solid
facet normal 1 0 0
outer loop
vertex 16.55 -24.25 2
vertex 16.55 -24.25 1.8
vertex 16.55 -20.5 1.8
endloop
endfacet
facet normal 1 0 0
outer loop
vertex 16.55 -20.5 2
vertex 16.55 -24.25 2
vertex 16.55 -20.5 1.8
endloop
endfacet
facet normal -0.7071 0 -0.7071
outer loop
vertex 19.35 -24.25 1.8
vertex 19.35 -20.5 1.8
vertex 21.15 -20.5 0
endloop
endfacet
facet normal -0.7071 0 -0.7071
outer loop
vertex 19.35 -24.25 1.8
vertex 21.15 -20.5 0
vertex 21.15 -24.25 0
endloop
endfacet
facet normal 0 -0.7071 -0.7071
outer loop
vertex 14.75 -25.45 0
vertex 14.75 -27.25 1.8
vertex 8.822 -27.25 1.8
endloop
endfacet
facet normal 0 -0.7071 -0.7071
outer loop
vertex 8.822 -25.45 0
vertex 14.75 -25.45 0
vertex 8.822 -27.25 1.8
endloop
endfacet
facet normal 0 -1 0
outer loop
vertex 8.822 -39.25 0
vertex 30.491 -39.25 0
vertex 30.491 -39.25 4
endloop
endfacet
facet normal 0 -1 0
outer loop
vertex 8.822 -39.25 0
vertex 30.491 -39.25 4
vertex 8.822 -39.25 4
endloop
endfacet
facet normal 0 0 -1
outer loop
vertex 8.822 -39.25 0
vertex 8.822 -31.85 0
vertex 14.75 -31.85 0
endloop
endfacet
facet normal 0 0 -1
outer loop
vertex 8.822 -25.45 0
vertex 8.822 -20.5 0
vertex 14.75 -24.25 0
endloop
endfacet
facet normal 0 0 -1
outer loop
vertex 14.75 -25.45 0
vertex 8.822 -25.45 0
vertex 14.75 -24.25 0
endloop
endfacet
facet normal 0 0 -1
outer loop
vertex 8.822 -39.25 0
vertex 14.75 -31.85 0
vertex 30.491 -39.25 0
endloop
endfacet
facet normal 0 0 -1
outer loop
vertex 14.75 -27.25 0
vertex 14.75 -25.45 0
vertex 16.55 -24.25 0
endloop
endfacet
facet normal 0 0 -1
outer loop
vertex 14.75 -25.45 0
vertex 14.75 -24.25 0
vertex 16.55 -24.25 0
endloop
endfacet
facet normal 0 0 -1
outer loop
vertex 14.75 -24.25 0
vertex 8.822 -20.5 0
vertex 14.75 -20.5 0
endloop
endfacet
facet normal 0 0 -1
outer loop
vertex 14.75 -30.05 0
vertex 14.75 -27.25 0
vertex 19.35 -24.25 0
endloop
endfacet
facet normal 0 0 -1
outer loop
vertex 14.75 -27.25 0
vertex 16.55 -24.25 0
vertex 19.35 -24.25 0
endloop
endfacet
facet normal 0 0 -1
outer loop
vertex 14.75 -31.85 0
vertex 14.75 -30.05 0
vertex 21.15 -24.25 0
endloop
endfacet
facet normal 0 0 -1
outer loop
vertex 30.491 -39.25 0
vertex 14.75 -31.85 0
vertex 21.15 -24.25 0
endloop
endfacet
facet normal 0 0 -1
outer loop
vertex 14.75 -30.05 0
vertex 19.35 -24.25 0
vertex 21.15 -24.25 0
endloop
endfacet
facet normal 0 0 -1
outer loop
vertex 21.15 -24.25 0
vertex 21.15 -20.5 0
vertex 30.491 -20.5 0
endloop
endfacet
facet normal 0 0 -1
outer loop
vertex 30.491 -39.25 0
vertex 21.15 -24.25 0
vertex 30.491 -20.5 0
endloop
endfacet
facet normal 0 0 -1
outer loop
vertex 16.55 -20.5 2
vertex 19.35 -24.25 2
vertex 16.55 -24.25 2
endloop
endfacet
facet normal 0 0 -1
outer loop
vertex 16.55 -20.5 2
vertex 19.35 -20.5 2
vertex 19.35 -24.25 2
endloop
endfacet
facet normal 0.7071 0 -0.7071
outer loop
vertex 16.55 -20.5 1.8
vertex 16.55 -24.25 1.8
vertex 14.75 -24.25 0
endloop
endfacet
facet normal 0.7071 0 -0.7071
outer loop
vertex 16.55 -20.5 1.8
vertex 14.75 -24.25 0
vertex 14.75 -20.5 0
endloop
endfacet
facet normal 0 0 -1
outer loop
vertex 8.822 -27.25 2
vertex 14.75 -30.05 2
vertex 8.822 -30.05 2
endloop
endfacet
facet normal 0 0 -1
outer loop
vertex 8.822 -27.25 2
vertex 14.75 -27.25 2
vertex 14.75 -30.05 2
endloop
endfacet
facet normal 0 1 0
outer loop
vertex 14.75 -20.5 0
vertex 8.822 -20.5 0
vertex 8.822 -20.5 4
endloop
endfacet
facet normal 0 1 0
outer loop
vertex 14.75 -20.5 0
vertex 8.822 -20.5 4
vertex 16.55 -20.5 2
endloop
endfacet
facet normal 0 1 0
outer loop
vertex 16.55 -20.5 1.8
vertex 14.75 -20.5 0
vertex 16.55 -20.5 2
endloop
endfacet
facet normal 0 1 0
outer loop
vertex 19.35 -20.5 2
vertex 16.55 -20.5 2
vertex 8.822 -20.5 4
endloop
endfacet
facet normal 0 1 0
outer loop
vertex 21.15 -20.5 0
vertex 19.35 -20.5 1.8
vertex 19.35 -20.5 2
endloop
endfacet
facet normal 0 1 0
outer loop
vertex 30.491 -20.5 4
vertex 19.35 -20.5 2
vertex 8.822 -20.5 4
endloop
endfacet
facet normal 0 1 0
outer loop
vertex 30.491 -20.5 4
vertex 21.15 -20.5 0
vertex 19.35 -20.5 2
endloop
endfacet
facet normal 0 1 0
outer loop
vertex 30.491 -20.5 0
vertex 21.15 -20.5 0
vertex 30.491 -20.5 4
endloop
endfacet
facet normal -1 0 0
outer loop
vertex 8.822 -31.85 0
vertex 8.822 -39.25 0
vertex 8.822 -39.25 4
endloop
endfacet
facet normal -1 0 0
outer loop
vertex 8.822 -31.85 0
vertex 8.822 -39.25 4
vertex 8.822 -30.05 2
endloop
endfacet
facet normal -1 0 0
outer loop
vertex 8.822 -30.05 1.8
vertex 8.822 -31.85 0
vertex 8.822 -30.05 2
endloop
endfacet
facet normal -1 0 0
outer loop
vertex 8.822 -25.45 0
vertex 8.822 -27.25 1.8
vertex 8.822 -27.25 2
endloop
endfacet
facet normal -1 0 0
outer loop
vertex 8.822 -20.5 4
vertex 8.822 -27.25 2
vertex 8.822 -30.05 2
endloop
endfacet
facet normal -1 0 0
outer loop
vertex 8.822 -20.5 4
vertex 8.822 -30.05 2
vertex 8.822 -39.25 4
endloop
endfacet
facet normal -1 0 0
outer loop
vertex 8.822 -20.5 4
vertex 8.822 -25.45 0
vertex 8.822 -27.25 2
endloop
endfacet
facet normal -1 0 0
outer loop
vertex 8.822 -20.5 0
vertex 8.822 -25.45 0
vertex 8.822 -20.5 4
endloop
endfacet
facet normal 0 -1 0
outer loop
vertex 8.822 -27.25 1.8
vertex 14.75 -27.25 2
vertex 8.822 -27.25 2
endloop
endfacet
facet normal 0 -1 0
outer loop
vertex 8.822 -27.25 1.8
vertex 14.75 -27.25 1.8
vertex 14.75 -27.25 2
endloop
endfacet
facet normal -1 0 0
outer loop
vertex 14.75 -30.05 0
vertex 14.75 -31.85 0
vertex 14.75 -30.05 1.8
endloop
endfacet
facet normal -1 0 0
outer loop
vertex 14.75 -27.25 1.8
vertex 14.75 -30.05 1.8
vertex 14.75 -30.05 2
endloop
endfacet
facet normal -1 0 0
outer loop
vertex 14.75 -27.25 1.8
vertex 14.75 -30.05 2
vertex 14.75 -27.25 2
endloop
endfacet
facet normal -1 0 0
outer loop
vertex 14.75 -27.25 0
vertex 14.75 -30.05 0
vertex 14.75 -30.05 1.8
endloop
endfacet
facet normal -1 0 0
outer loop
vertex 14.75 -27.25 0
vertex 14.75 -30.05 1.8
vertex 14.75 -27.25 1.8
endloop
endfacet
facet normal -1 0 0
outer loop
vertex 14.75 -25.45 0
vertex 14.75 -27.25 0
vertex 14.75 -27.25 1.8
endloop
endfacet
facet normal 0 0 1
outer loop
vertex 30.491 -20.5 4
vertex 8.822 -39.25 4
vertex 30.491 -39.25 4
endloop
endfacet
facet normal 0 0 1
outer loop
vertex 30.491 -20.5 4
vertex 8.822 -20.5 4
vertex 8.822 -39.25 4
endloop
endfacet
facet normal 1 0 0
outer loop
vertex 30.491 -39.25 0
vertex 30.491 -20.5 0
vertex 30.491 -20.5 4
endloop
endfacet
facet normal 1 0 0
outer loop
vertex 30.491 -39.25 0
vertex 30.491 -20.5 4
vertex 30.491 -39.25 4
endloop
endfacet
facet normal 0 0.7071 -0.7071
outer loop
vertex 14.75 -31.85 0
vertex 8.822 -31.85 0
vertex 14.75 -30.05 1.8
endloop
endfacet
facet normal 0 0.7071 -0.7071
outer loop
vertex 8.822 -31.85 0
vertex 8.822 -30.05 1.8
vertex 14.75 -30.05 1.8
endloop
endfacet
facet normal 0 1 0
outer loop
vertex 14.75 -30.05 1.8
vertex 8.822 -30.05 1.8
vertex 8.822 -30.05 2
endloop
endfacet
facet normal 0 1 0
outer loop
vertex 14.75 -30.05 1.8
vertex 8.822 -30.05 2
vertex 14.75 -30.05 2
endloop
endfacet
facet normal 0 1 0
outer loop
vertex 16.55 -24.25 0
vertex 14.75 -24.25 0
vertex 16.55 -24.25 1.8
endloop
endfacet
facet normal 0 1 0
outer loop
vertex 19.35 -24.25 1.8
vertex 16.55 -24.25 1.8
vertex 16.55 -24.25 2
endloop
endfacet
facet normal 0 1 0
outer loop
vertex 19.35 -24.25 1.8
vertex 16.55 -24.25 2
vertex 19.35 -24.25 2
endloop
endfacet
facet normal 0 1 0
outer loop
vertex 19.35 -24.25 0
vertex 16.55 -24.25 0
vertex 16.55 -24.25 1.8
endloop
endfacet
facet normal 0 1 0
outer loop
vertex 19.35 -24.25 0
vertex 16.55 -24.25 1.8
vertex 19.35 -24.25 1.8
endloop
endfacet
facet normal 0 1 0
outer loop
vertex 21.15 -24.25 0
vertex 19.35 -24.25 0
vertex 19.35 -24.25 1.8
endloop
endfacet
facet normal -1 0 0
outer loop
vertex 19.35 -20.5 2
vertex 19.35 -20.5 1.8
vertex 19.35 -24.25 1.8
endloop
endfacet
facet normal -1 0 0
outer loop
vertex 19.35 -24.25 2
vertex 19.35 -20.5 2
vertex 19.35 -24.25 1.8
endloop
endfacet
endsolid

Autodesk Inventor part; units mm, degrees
ref_plane "YZ Plane" through (0, 0, 0) normal (1, 0, 0) x (0, 1, 0)
ref_plane "XZ Plane" through (0, 0, 0) normal (0, 1, 0) x (-1, 0, 0)
ref_plane "XY Plane" through (0, 0, 0) normal (0, 0, 1) x (1, 0, 0)
ref_plane "Arbeitsebene1" through (0, 0, 0) normal (0, 0, 1) x (1, 0, 0)
sketch "Skizze1" plane through (0, 0, 0) normal (0, 0, 1) x (1, 0, 0)
  line L0 (8.8222, -7.25) -> (-9.1, -7.25) projected
  line L1 (-9.1, -7.25) -> (-9.1, 29.75) projected
  line L2 (-9.1, 29.75) -> (45.9, 29.75) projected
  line L3 (45.9, 29.75) -> (45.9, -7.25) projected
  line L4 (45.9, -7.25) -> (27.9778, -7.25) projected
  line L5 (-63.9, -32.5058) -> (-63.9, -38.75) projected
  line L6 (63.9, -38.75) -> (63.9, 3.9837) projected
  line L7 (63.9, 3.9837) -> (56.9, 3.9837) projected
  line L8 (56.9, 3.9837) -> (56.9, 8.0046) projected
  spline S0 degree 2 poles (56.9, 8.0046) (47.4544, 9.25) (56.9, 10.4954) knots 0.408689 0.408689 0.408689 2.009633 2.009633 2.009633 weights 1.06106 1.156332 1.06106 projected
  line L9 (56.9, 10.4954) -> (56.9, 14.5163) projected
  line L10 (56.9, 14.5163) -> (63.9, 14.5163) projected
  arc A0 (63.9, 38.75) -> (59.9, 42.75) centre (59.9, 38.75) ccw projected
  line L11 (59.9, 42.75) -> (-59.9, 42.75) projected
  arc A1 (-59.9, 42.75) -> (-63.9, 38.75) centre (-59.9, 38.75) ccw projected
  line L12 (-63.9, 25.4963) -> (-55.9, 25.4963) projected
  line L13 (-55.9, 25.4963) -> (-55.9, 19.75) projected
  line L14 (-55.9, 19.75) -> (-18.9, 19.75) projected
  line L15 (-18.9, 19.75) -> (-18.9, 10.3274) projected
  spline S1 degree 2 poles (-18.9, 10.3274) (-11.6855, 9.25) (-18.9, 8.1726) knots 0.06387 0.06387 0.06387 0.952272 0.952272 0.952272 weights 1.010578 1.079212 1.010578 projected
  line L16 (-18.9, 8.1726) -> (-18.9, -1.25) projected
  line L17 (-18.9, -1.25) -> (-55.9, -1.25) projected
  line L18 (-55.9, -1.25) -> (-55.9, -6.9963) projected
  line L19 (-55.9, -6.9963) -> (-63.9, -6.9963) projected
  line L20 (-63.9, -6.9963) -> (-63.9, -22.9942) projected
  line L21 (14.75, -32.05) -> (21.15, -32.05)
  line L22 (21.15, -32.05) -> (21.15, -24.25)
  line L23 (21.15, -24.25) -> (14.75, -24.25)
  line L24 (14.75, -24.25) -> (14.75, -32.05)
  line L25 (8.8222, -20.5) -> (30.4914, -20.5)
  line L26 (30.4914, -20.5) -> (30.4914, -39.25)
  line L27 (30.4914, -39.25) -> (8.8222, -39.25)
  line L28 (8.8222, -39.25) -> (8.8222, -20.5)
  line L29 (63.9, 14.5163) -> (63.9, 38.75) projected
  circle A2 centre (5.4922, -12.0867) radius 1.4 projected
  circle A3 centre (17.95, -36.25) radius 1.4 projected
  circle A4 centre (-27.8589, -14.9953) radius 1.4 projected
  circle A5 centre (-42.2276, -36.25) radius 1.4 projected
  circle A6 centre (-42.2276, -19.25) radius 1.4 projected
  circle A7 centre (-27.8589, -39.949) radius 1.4 projected
  circle A8 centre (27.4914, -28.65) radius 1.4 projected
  circle A9 centre (32.285, -12.0867) radius 1.4 projected
  line L30 (-8.36, -23.75) -> (8.8222, -23.75) projected
  line L31 (8.8222, -23.75) -> (8.8222, -7.25) projected
  line L32 (27.9778, -7.25) -> (27.9778, -25.25) projected
  line L33 (27.9778, -25.25) -> (21.15, -25.25) projected
  line L34 (21.15, -25.25) -> (21.15, -32.05) projected
  line L35 (21.15, -32.05) -> (14.75, -32.05) projected
  line L36 (14.75, -32.05) -> (14.75, -31.75) projected
  line L37 (14.75, -31.75) -> (-8.36, -31.75) projected
  line L38 (-8.36, -31.75) -> (-8.36, -36.25) projected
  line L39 (-8.36, -36.25) -> (-23.36, -36.25) projected
  line L40 (-23.36, -33.75) -> (-23.36, -36.25) projected
  line L41 (-38.36, -33.75) -> (-23.36, -33.75) projected
  line L42 (-38.36, -33.75) -> (-38.36, -31.25) projected
  line L43 (-38.36, -31.25) -> (-41.36, -31.25) projected
  line L44 (-41.36, -31.25) -> (-41.36, -32.5058) projected
  line L45 (-41.36, -32.5058) -> (-63.9, -32.5058) projected
  arc A10 (-63.9, -38.75) -> (-59.9, -42.75) centre (-59.9, -38.75) ccw projected
  line L46 (-59.9, -42.75) -> (59.9, -42.75) projected
  arc A11 (59.9, -42.75) -> (63.9, -38.75) centre (59.9, -38.75) ccw projected
  line L47 (-63.9, 38.75) -> (-63.9, 25.4963) projected
  line L48 (-63.9, -22.9942) -> (-41.36, -22.9942) projected
  line L49 (-41.36, -22.9942) -> (-41.36, -24.25) projected
  line L50 (-41.36, -24.25) -> (-38.36, -24.25) projected
  line L51 (-38.36, -24.25) -> (-38.36, -21.75) projected
  line L52 (-38.36, -21.75) -> (-23.36, -21.75) projected
  line L53 (-23.36, -19.25) -> (-23.36, -21.75) projected
  line L54 (-23.36, -19.25) -> (-8.36, -19.25) projected
  line L55 (-8.36, -19.25) -> (-8.36, -23.75) projected
  point P0 (0, 0)
  point P1 (15.25, -24.75)
  dimension "d0" = 0.5
extrude "Extrusion1" add sketch "Skizze1" along normal blind 4 contours L25 L32 L33 L22 L23 L24 L37 L28 | L25 L26 L27 L28 L37 L24 L21 L22 L33 L32 | L22 L21 L24 L23 | A3 | A8
sketch "Skizze2" plane through (0, 0, 0) normal (0, 0, -1) x (-1, 0, 0)
  line L0 (-8.8222, -39.25) -> (-30.4914, -39.25) projected
  line L1 (-8.8222, -20.5) -> (-8.8222, -39.25) projected
  line L2 (-30.4914, -20.5) -> (-8.8222, -20.5) projected
  line L3 (-30.4914, -39.25) -> (-30.4914, -20.5) projected
  line L4 (-14.75, -32.05) -> (-14.75, -24.25) projected
  line L5 (-8.8222, -20.5) -> (-8.8222, -39.25) projected
  line L6 (-14.75, -27.25) -> (-8.8222, -27.25)
  line L7 (-8.8222, -27.25) -> (-8.8222, -30.05)
  line L8 (-8.8222, -30.05) -> (-14.75, -30.05)
  line L9 (-14.75, -30.05) -> (-14.75, -27.25)
  line L10 (-14.75, -24.25) -> (-21.15, -24.25) projected
  line L11 (-30.4914, -20.5) -> (-8.8222, -20.5) projected
  line L12 (-19.35, -24.25) -> (-16.55, -24.25)
  line L13 (-16.55, -24.25) -> (-16.55, -20.5)
  line L14 (-16.55, -20.5) -> (-19.35, -20.5)
  line L15 (-19.35, -20.5) -> (-19.35, -24.25)
  point P0 (0, 0)
extrude "Extrusion2" cut sketch "Skizze2" against normal blind 2 contours L8 L4 L6 L1 | L2 L13 L10 L15
chamfer "Fase1" distance 1.8 angle 45 4 edges at (11.7861, -30.05, 0) (11.7861, -27.25, 0) (16.55, -22.375, 0) (19.35, -22.375, 0)
properties part number "20_Scanner_Fixation"
